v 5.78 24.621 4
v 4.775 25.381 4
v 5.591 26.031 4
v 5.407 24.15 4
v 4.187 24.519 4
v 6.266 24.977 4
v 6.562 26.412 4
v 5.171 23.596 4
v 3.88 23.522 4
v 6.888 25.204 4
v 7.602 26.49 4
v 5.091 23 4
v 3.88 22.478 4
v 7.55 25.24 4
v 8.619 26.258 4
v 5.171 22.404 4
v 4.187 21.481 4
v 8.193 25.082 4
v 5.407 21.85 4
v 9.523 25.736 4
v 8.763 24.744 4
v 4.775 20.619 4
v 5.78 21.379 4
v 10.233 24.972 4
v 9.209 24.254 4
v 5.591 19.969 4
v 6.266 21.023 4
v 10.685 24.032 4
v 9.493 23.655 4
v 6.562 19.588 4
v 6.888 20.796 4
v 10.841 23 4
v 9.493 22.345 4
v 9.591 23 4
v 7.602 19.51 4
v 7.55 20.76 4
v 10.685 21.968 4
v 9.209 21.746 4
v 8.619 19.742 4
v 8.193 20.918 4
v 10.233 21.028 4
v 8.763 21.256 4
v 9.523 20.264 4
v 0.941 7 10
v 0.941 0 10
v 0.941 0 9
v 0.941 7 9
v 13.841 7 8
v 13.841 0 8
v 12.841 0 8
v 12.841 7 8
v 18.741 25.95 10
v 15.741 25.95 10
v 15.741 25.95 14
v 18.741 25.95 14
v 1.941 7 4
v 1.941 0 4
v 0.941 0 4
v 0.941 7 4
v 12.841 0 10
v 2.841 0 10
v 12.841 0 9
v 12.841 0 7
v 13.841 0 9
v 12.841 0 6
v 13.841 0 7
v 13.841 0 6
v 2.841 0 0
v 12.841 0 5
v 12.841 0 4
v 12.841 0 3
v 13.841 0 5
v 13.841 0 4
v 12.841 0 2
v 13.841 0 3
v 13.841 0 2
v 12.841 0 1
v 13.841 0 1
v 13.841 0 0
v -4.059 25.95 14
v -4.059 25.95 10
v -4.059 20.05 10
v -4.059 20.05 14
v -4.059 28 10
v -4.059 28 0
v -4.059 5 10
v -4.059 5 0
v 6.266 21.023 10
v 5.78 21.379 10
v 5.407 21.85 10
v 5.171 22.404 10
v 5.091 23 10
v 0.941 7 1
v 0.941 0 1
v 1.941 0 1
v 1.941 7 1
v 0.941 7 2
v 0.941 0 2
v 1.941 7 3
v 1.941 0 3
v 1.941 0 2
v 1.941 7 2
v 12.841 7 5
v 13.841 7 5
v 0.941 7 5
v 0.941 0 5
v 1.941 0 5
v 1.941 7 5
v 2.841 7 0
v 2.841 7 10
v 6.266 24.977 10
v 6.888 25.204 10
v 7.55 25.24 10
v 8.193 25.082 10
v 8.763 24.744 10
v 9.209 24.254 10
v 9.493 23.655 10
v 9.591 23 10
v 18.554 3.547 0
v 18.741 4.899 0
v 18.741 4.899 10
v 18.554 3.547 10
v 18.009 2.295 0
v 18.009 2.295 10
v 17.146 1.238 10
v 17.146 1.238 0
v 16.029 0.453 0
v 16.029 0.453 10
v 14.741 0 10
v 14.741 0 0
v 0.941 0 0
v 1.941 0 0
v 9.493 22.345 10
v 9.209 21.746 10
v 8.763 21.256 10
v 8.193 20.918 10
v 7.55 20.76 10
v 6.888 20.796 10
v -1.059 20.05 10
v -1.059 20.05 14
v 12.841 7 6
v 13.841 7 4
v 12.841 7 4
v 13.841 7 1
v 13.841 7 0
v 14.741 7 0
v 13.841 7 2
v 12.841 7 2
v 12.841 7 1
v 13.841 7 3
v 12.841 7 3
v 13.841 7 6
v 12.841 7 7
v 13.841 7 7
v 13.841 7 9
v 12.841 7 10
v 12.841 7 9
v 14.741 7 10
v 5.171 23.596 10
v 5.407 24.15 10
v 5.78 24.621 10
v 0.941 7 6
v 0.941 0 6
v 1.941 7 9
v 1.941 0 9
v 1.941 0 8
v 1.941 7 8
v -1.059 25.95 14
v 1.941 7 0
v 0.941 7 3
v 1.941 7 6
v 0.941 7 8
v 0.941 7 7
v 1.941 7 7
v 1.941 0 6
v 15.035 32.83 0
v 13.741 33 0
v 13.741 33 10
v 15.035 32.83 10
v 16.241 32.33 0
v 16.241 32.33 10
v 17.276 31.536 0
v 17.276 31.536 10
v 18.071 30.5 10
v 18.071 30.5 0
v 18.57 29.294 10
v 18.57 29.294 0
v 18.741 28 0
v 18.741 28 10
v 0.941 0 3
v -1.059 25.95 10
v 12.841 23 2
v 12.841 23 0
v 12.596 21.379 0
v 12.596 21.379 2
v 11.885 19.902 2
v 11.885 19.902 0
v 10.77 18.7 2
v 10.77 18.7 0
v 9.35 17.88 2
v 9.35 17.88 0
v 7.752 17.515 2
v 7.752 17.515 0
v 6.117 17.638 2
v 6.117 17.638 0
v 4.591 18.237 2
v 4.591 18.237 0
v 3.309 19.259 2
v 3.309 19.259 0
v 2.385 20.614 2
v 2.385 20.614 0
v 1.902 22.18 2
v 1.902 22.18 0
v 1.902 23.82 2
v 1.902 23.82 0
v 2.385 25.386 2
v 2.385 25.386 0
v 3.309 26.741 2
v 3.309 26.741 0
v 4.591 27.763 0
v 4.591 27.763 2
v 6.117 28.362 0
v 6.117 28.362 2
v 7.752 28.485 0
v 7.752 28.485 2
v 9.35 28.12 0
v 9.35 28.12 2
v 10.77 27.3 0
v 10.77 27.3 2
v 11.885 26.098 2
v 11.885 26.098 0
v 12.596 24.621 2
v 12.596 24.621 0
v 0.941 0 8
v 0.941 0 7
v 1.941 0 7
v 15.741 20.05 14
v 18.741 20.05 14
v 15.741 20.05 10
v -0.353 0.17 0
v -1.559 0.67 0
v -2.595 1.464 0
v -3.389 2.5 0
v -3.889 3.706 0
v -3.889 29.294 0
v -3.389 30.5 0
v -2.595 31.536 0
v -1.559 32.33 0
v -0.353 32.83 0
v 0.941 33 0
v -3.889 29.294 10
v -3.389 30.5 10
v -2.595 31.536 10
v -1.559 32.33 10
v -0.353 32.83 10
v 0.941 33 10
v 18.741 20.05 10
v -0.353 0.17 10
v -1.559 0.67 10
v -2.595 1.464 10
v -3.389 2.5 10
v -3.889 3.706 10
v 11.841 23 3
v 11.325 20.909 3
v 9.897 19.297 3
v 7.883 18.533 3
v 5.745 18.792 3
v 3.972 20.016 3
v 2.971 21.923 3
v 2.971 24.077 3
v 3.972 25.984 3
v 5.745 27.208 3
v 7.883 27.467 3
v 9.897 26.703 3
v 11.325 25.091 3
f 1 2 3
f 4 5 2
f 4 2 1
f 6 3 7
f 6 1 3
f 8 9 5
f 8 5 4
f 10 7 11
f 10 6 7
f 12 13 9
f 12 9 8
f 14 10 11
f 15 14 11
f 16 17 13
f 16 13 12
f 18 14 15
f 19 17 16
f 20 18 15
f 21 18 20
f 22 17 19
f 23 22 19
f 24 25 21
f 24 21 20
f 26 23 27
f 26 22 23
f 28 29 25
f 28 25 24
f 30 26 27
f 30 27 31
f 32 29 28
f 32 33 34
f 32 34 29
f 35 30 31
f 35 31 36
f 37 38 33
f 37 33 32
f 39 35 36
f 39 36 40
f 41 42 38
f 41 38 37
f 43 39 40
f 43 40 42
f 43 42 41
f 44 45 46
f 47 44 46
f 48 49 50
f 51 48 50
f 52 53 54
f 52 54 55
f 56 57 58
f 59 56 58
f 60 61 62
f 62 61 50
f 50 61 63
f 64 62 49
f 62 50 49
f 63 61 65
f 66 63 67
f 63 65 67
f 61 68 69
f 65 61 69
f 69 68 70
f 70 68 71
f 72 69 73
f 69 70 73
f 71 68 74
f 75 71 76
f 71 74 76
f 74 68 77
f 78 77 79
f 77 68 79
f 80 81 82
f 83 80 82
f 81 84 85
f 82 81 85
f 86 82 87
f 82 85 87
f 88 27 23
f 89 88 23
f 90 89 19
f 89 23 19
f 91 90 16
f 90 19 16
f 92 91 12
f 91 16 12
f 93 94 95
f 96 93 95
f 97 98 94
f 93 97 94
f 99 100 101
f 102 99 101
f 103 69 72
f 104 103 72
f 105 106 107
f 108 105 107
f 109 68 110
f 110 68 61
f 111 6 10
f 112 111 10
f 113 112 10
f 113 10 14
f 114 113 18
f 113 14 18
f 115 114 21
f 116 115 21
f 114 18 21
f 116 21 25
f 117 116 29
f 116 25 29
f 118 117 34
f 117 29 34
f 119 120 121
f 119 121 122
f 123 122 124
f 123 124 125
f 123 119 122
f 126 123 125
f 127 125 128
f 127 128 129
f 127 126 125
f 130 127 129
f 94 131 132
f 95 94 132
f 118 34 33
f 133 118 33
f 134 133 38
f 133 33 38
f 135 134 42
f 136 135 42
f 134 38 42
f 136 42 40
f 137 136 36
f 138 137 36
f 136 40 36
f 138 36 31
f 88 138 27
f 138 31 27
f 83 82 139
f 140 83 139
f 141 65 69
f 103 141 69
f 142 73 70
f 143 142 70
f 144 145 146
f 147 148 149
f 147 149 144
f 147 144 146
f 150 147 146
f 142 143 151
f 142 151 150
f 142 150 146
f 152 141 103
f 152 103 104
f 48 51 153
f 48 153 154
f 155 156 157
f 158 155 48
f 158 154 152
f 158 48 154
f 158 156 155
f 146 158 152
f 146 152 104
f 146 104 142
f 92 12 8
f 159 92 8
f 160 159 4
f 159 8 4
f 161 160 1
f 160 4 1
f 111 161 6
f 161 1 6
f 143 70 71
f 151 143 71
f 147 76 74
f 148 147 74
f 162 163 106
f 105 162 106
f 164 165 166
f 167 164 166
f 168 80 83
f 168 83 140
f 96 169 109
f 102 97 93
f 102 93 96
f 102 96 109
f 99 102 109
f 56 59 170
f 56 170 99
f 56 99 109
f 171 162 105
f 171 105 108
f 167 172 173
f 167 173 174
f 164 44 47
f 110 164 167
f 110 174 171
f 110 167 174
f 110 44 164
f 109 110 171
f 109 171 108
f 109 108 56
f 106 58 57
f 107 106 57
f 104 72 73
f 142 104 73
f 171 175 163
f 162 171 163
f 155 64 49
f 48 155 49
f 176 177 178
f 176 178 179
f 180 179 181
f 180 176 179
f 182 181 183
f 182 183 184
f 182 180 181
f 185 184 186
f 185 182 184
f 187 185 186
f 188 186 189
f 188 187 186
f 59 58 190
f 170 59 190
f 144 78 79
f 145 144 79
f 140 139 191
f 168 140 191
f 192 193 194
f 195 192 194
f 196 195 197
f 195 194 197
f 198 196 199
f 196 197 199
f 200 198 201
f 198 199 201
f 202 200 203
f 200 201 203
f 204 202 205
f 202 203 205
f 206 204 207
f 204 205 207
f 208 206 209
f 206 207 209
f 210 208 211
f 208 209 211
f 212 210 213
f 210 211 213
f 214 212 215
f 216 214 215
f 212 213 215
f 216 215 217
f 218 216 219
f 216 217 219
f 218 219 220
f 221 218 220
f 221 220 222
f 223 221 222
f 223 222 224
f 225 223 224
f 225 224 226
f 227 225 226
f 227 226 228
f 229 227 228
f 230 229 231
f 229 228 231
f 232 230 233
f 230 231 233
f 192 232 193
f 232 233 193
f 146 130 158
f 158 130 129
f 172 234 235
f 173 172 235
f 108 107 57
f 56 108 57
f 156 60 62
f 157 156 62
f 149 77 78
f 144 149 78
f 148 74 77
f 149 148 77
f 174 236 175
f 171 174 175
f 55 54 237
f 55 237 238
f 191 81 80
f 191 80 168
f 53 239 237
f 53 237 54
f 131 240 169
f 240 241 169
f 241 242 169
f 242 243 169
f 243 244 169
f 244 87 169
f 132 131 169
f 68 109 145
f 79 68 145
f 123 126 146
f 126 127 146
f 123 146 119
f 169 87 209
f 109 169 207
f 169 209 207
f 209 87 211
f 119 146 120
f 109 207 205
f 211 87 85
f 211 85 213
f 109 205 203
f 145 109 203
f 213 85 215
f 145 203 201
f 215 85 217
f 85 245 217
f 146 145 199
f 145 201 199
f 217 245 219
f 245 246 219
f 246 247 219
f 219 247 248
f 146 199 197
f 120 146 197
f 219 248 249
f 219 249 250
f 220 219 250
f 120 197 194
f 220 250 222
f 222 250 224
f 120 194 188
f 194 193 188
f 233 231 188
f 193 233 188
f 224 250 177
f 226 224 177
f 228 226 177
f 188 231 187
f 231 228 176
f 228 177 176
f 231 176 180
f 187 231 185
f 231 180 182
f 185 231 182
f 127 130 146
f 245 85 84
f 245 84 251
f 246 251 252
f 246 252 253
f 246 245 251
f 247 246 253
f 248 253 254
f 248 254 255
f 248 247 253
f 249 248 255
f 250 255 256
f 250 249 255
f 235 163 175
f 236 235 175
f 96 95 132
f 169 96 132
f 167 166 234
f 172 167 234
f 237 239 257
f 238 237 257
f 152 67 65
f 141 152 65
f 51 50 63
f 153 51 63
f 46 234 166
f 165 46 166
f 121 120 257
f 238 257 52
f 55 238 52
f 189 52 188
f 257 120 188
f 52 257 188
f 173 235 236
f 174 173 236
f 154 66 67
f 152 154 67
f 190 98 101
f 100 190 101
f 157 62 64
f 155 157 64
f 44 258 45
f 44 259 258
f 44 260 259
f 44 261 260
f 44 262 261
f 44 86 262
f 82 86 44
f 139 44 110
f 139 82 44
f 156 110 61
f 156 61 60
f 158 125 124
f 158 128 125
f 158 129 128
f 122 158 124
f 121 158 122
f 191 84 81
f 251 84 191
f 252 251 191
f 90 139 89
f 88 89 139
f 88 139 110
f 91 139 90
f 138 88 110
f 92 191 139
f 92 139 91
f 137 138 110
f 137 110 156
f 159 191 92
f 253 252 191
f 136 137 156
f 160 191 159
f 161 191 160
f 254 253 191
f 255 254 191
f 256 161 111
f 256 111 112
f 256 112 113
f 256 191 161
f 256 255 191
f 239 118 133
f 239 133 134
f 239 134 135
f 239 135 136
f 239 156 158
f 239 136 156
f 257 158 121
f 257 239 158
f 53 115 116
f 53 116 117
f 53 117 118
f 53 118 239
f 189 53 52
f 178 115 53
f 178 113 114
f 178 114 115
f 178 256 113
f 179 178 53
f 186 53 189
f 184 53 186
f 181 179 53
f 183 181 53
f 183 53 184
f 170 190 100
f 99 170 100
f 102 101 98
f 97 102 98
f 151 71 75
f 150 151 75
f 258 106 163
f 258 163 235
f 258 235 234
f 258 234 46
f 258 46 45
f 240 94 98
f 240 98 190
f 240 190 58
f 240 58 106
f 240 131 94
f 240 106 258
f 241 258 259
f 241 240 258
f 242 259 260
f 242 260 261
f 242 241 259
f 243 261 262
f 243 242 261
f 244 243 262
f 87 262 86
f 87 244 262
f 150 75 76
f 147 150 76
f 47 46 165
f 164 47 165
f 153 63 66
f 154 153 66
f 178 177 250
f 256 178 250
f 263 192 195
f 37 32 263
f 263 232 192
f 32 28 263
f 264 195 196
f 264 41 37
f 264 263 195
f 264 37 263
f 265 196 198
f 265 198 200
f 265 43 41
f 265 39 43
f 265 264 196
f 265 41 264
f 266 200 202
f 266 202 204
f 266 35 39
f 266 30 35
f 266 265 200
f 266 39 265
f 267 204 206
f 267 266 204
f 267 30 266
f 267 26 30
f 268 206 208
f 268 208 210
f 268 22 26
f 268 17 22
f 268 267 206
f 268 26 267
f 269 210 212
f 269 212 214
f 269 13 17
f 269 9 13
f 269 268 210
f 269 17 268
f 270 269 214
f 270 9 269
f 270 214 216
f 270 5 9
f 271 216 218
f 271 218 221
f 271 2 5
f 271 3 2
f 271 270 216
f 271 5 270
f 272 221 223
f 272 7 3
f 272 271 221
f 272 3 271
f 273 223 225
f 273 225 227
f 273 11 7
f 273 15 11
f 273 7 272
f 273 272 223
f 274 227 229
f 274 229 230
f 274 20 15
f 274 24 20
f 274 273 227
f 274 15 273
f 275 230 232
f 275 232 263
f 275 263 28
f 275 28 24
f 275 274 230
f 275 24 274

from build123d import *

# Parameters (mm, degrees)
F0_W        = 18.5
F0_H        = 13
F0_W_2      = 4.3
F0_W_3      = 3
F0_H_2      = 2.95
F1_DEPTH    = 10
F3_DEPTH    = 7
F4_T1_DEPTH = 35
F4_T3_DEPTH = 34.4948974279
F0_H_3      = 5.9
F5_DEPTH    = 14
F6_R        = 5.5
F7_DEPTH    = 4
F8_SIZE     = 2


# Not quite as in the source:
# - a fillet or chamfer that OpenCascade refuses, or shapes differently, is made with other operations: its cross-section is extruded or revolved along the edge and cut away or added


with BuildPart() as f1:
    # F0 (on Top) → F1 (new body)
    with BuildSketch(Plane.XY):
        with Locations((5.190736489, 6.5)):
            Rectangle(F0_W, F0_H)
        with Locations((16.590736489, 6.5)):
            Rectangle(F0_W_2, F0_H)
        Polygon((14.440736489, 20.05), (14.440736489, 13), (18.740736489, 13), (18.740736489, 20.05), (15.740736489, 20.05), (15.740736489, 25.95), (18.740736489, 25.95), (18.740736489, 33), (14.440736489, 33), (14.440736489, 25.95), (14.440736489, 23), align=None)
        with BuildLine():
            Line((-4.059263511, 20.05), (-4.059263511, 13))
            Line((-4.059263511, 13), (14.440736489, 13))
            Line((14.440736489, 13), (14.440736489, 20.05))
            Line((14.440736489, 20.05), (11.440736489, 20.05))
            Line((11.440736489, 20.05), (11.440736489, 23))
            Line((11.440736489, 23), (9.590736489, 23))
            ThreePointArc((9.590736489, 23), (8.4904647177, 21.0659304563), (6.265736489, 21.0234183548))
            ThreePointArc((6.265736489, 21.0234183548), (4.0410082602, 21.0659304563), (2.940736489, 23))
            Line((2.940736489, 23), (-1.059263511, 23))
            Line((-1.059263511, 23), (-1.059263511, 20.05))
            Line((-1.059263511, 20.05), (-4.059263511, 20.05))
        make_face()
        with Locations((12.940736489, 21.525)):
            Rectangle(F0_W_3, F0_H_2)
        with Locations((12.940736489, 24.475)):
            Rectangle(F0_W_3, F0_H_2)
        with BuildLine():
            Line((-4.059263511, 33), (-4.059263511, 25.95))
            Line((-4.059263511, 25.95), (-1.059263511, 25.95))
            Line((-1.059263511, 25.95), (-1.059263511, 23))
            Line((-1.059263511, 23), (2.940736489, 23))
            ThreePointArc((2.940736489, 23), (4.0410082602, 24.9340695437), (6.265736489, 24.9765816452))
            ThreePointArc((6.265736489, 24.9765816452), (8.4904647177, 24.9340695437), (9.590736489, 23))
            Line((9.590736489, 23), (11.440736489, 23))
            Line((11.440736489, 23), (11.440736489, 25.95))
            Line((11.440736489, 25.95), (14.440736489, 25.95))
            Line((14.440736489, 25.95), (14.440736489, 33))
            Line((14.440736489, 33), (-4.059263511, 33))
        make_face()
        with BuildLine():
            Line((5.090736489, 23), (2.940736489, 23))
            ThreePointArc((2.940736489, 23), (4.0410082602, 21.0659304563), (6.265736489, 21.0234183548))
            ThreePointArc((6.265736489, 21.0234183548), (5.4066669452, 21.8502717712), (5.090736489, 23))
        make_face()
        with BuildLine():
            ThreePointArc((6.265736489, 24.9765816452), (4.0410082602, 24.9340695437), (2.940736489, 23))
            Line((2.940736489, 23), (5.090736489, 23))
            ThreePointArc((5.090736489, 23), (5.4066669452, 24.1497282288), (6.265736489, 24.9765816452))
        make_face()
    extrude(amount=F1_DEPTH)

    # F2 (on face) → F3 (cut)
    with BuildSketch(Plane.XZ):
        Polygon((2.840736489, 10), (0.940736489, 10), (0.940736489, 9), (1.940736489, 9), (1.940736489, 8), (0.940736489, 8), (0.940736489, 7), (1.940736489, 7), (1.940736489, 6), (0.940736489, 6), (0.940736489, 5), (1.940736489, 5), (1.940736489, 4), (0.940736489, 4), (0.940736489, 3), (1.940736489, 3), (1.940736489, 2), (0.940736489, 2), (0.940736489, 1), (1.940736489, 1), (1.940736489, 0), (2.840736489, 0), align=None)
        Polygon((14.740736489, 10), (12.840736489, 10), (12.840736489, 9), (13.840736489, 9), (13.840736489, 8), (12.840736489, 8), (12.840736489, 7), (13.840736489, 7), (13.840736489, 6), (12.840736489, 6), (12.840736489, 5), (13.840736489, 5), (13.840736489, 4), (12.840736489, 4), (12.840736489, 3), (13.840736489, 3), (13.840736489, 2), (12.840736489, 2), (12.840736489, 1), (13.840736489, 1), (13.840736489, 0), (14.740736489, 0), align=None)
    extrude(amount=-F3_DEPTH, mode=Mode.SUBTRACT)

    # F4: fillet of radius 5 on 4 edges, made by hand

    # F4_s2 → F4_t1 (cut)
    with BuildSketch(Plane.XY.offset(-12.5)):
        with BuildLine():
            ThreePointArc((-4.059263511, 28), (-2.594797417, 31.5355339059), (0.940736489, 33))
            Line((0.940736489, 33), (-4.059263511, 33))
            Line((-4.059263511, 33), (-4.059263511, 28))
        make_face()
        with BuildLine():
            ThreePointArc((0.940736489, 0), (-2.594797417, 1.4644660941), (-4.059263511, 5))
            Line((-4.059263511, 5), (-4.059263511, 0))
            Line((-4.059263511, 0), (0.940736489, 0))
        make_face()
        with BuildLine():
            ThreePointArc((13.740736489, 33), (17.2762703949, 31.5355339059), (18.740736489, 28))
            Line((18.740736489, 28), (18.740736489, 33))
            Line((18.740736489, 33), (13.740736489, 33))
        make_face()
    extrude(amount=F4_T1_DEPTH, mode=Mode.SUBTRACT)

    # F4_s4 → F4_t3 (cut)
    with BuildSketch(Plane.XY.offset(-12.2474487139)):
        with BuildLine():
            ThreePointArc((18.740736489, 4.8989794856), (17.6137198352, 1.7367018254), (14.740736489, 0))
            Line((14.740736489, 0), (18.740736489, 0))
            Line((18.740736489, 0), (18.740736489, 4.8989794856))
        make_face()
    extrude(amount=F4_T3_DEPTH, mode=Mode.SUBTRACT)

    # F0 (on Top) → F5 (join)
    with BuildSketch(Plane.XY):
        with Locations((-2.559263511, 24.475)):
            Rectangle(F0_W_3, F0_H_2)
        with Locations((-2.559263511, 21.525)):
            Rectangle(F0_W_3, F0_H_2)
        with Locations((17.240736489, 23)):
            Rectangle(F0_W_3, F0_H_3)
    extrude(amount=F5_DEPTH)

    # F6 (on face) → F7 (cut)
    with BuildSketch(Plane(origin=(0, 0, 0), x_dir=(1, 0, 0), z_dir=(0, 0, -1))):
        with Locations((7.340736489, -23)):
            Circle(F6_R)
    extrude(amount=-F7_DEPTH, mode=Mode.SUBTRACT)

    # F8
    f8_edges = [f1.edges().sort_by_distance(p)[0] for p in [
        (1.840736, 23, 4),
    ]]
    chamfer(f8_edges, length=F8_SIZE)


solid = f1.part
